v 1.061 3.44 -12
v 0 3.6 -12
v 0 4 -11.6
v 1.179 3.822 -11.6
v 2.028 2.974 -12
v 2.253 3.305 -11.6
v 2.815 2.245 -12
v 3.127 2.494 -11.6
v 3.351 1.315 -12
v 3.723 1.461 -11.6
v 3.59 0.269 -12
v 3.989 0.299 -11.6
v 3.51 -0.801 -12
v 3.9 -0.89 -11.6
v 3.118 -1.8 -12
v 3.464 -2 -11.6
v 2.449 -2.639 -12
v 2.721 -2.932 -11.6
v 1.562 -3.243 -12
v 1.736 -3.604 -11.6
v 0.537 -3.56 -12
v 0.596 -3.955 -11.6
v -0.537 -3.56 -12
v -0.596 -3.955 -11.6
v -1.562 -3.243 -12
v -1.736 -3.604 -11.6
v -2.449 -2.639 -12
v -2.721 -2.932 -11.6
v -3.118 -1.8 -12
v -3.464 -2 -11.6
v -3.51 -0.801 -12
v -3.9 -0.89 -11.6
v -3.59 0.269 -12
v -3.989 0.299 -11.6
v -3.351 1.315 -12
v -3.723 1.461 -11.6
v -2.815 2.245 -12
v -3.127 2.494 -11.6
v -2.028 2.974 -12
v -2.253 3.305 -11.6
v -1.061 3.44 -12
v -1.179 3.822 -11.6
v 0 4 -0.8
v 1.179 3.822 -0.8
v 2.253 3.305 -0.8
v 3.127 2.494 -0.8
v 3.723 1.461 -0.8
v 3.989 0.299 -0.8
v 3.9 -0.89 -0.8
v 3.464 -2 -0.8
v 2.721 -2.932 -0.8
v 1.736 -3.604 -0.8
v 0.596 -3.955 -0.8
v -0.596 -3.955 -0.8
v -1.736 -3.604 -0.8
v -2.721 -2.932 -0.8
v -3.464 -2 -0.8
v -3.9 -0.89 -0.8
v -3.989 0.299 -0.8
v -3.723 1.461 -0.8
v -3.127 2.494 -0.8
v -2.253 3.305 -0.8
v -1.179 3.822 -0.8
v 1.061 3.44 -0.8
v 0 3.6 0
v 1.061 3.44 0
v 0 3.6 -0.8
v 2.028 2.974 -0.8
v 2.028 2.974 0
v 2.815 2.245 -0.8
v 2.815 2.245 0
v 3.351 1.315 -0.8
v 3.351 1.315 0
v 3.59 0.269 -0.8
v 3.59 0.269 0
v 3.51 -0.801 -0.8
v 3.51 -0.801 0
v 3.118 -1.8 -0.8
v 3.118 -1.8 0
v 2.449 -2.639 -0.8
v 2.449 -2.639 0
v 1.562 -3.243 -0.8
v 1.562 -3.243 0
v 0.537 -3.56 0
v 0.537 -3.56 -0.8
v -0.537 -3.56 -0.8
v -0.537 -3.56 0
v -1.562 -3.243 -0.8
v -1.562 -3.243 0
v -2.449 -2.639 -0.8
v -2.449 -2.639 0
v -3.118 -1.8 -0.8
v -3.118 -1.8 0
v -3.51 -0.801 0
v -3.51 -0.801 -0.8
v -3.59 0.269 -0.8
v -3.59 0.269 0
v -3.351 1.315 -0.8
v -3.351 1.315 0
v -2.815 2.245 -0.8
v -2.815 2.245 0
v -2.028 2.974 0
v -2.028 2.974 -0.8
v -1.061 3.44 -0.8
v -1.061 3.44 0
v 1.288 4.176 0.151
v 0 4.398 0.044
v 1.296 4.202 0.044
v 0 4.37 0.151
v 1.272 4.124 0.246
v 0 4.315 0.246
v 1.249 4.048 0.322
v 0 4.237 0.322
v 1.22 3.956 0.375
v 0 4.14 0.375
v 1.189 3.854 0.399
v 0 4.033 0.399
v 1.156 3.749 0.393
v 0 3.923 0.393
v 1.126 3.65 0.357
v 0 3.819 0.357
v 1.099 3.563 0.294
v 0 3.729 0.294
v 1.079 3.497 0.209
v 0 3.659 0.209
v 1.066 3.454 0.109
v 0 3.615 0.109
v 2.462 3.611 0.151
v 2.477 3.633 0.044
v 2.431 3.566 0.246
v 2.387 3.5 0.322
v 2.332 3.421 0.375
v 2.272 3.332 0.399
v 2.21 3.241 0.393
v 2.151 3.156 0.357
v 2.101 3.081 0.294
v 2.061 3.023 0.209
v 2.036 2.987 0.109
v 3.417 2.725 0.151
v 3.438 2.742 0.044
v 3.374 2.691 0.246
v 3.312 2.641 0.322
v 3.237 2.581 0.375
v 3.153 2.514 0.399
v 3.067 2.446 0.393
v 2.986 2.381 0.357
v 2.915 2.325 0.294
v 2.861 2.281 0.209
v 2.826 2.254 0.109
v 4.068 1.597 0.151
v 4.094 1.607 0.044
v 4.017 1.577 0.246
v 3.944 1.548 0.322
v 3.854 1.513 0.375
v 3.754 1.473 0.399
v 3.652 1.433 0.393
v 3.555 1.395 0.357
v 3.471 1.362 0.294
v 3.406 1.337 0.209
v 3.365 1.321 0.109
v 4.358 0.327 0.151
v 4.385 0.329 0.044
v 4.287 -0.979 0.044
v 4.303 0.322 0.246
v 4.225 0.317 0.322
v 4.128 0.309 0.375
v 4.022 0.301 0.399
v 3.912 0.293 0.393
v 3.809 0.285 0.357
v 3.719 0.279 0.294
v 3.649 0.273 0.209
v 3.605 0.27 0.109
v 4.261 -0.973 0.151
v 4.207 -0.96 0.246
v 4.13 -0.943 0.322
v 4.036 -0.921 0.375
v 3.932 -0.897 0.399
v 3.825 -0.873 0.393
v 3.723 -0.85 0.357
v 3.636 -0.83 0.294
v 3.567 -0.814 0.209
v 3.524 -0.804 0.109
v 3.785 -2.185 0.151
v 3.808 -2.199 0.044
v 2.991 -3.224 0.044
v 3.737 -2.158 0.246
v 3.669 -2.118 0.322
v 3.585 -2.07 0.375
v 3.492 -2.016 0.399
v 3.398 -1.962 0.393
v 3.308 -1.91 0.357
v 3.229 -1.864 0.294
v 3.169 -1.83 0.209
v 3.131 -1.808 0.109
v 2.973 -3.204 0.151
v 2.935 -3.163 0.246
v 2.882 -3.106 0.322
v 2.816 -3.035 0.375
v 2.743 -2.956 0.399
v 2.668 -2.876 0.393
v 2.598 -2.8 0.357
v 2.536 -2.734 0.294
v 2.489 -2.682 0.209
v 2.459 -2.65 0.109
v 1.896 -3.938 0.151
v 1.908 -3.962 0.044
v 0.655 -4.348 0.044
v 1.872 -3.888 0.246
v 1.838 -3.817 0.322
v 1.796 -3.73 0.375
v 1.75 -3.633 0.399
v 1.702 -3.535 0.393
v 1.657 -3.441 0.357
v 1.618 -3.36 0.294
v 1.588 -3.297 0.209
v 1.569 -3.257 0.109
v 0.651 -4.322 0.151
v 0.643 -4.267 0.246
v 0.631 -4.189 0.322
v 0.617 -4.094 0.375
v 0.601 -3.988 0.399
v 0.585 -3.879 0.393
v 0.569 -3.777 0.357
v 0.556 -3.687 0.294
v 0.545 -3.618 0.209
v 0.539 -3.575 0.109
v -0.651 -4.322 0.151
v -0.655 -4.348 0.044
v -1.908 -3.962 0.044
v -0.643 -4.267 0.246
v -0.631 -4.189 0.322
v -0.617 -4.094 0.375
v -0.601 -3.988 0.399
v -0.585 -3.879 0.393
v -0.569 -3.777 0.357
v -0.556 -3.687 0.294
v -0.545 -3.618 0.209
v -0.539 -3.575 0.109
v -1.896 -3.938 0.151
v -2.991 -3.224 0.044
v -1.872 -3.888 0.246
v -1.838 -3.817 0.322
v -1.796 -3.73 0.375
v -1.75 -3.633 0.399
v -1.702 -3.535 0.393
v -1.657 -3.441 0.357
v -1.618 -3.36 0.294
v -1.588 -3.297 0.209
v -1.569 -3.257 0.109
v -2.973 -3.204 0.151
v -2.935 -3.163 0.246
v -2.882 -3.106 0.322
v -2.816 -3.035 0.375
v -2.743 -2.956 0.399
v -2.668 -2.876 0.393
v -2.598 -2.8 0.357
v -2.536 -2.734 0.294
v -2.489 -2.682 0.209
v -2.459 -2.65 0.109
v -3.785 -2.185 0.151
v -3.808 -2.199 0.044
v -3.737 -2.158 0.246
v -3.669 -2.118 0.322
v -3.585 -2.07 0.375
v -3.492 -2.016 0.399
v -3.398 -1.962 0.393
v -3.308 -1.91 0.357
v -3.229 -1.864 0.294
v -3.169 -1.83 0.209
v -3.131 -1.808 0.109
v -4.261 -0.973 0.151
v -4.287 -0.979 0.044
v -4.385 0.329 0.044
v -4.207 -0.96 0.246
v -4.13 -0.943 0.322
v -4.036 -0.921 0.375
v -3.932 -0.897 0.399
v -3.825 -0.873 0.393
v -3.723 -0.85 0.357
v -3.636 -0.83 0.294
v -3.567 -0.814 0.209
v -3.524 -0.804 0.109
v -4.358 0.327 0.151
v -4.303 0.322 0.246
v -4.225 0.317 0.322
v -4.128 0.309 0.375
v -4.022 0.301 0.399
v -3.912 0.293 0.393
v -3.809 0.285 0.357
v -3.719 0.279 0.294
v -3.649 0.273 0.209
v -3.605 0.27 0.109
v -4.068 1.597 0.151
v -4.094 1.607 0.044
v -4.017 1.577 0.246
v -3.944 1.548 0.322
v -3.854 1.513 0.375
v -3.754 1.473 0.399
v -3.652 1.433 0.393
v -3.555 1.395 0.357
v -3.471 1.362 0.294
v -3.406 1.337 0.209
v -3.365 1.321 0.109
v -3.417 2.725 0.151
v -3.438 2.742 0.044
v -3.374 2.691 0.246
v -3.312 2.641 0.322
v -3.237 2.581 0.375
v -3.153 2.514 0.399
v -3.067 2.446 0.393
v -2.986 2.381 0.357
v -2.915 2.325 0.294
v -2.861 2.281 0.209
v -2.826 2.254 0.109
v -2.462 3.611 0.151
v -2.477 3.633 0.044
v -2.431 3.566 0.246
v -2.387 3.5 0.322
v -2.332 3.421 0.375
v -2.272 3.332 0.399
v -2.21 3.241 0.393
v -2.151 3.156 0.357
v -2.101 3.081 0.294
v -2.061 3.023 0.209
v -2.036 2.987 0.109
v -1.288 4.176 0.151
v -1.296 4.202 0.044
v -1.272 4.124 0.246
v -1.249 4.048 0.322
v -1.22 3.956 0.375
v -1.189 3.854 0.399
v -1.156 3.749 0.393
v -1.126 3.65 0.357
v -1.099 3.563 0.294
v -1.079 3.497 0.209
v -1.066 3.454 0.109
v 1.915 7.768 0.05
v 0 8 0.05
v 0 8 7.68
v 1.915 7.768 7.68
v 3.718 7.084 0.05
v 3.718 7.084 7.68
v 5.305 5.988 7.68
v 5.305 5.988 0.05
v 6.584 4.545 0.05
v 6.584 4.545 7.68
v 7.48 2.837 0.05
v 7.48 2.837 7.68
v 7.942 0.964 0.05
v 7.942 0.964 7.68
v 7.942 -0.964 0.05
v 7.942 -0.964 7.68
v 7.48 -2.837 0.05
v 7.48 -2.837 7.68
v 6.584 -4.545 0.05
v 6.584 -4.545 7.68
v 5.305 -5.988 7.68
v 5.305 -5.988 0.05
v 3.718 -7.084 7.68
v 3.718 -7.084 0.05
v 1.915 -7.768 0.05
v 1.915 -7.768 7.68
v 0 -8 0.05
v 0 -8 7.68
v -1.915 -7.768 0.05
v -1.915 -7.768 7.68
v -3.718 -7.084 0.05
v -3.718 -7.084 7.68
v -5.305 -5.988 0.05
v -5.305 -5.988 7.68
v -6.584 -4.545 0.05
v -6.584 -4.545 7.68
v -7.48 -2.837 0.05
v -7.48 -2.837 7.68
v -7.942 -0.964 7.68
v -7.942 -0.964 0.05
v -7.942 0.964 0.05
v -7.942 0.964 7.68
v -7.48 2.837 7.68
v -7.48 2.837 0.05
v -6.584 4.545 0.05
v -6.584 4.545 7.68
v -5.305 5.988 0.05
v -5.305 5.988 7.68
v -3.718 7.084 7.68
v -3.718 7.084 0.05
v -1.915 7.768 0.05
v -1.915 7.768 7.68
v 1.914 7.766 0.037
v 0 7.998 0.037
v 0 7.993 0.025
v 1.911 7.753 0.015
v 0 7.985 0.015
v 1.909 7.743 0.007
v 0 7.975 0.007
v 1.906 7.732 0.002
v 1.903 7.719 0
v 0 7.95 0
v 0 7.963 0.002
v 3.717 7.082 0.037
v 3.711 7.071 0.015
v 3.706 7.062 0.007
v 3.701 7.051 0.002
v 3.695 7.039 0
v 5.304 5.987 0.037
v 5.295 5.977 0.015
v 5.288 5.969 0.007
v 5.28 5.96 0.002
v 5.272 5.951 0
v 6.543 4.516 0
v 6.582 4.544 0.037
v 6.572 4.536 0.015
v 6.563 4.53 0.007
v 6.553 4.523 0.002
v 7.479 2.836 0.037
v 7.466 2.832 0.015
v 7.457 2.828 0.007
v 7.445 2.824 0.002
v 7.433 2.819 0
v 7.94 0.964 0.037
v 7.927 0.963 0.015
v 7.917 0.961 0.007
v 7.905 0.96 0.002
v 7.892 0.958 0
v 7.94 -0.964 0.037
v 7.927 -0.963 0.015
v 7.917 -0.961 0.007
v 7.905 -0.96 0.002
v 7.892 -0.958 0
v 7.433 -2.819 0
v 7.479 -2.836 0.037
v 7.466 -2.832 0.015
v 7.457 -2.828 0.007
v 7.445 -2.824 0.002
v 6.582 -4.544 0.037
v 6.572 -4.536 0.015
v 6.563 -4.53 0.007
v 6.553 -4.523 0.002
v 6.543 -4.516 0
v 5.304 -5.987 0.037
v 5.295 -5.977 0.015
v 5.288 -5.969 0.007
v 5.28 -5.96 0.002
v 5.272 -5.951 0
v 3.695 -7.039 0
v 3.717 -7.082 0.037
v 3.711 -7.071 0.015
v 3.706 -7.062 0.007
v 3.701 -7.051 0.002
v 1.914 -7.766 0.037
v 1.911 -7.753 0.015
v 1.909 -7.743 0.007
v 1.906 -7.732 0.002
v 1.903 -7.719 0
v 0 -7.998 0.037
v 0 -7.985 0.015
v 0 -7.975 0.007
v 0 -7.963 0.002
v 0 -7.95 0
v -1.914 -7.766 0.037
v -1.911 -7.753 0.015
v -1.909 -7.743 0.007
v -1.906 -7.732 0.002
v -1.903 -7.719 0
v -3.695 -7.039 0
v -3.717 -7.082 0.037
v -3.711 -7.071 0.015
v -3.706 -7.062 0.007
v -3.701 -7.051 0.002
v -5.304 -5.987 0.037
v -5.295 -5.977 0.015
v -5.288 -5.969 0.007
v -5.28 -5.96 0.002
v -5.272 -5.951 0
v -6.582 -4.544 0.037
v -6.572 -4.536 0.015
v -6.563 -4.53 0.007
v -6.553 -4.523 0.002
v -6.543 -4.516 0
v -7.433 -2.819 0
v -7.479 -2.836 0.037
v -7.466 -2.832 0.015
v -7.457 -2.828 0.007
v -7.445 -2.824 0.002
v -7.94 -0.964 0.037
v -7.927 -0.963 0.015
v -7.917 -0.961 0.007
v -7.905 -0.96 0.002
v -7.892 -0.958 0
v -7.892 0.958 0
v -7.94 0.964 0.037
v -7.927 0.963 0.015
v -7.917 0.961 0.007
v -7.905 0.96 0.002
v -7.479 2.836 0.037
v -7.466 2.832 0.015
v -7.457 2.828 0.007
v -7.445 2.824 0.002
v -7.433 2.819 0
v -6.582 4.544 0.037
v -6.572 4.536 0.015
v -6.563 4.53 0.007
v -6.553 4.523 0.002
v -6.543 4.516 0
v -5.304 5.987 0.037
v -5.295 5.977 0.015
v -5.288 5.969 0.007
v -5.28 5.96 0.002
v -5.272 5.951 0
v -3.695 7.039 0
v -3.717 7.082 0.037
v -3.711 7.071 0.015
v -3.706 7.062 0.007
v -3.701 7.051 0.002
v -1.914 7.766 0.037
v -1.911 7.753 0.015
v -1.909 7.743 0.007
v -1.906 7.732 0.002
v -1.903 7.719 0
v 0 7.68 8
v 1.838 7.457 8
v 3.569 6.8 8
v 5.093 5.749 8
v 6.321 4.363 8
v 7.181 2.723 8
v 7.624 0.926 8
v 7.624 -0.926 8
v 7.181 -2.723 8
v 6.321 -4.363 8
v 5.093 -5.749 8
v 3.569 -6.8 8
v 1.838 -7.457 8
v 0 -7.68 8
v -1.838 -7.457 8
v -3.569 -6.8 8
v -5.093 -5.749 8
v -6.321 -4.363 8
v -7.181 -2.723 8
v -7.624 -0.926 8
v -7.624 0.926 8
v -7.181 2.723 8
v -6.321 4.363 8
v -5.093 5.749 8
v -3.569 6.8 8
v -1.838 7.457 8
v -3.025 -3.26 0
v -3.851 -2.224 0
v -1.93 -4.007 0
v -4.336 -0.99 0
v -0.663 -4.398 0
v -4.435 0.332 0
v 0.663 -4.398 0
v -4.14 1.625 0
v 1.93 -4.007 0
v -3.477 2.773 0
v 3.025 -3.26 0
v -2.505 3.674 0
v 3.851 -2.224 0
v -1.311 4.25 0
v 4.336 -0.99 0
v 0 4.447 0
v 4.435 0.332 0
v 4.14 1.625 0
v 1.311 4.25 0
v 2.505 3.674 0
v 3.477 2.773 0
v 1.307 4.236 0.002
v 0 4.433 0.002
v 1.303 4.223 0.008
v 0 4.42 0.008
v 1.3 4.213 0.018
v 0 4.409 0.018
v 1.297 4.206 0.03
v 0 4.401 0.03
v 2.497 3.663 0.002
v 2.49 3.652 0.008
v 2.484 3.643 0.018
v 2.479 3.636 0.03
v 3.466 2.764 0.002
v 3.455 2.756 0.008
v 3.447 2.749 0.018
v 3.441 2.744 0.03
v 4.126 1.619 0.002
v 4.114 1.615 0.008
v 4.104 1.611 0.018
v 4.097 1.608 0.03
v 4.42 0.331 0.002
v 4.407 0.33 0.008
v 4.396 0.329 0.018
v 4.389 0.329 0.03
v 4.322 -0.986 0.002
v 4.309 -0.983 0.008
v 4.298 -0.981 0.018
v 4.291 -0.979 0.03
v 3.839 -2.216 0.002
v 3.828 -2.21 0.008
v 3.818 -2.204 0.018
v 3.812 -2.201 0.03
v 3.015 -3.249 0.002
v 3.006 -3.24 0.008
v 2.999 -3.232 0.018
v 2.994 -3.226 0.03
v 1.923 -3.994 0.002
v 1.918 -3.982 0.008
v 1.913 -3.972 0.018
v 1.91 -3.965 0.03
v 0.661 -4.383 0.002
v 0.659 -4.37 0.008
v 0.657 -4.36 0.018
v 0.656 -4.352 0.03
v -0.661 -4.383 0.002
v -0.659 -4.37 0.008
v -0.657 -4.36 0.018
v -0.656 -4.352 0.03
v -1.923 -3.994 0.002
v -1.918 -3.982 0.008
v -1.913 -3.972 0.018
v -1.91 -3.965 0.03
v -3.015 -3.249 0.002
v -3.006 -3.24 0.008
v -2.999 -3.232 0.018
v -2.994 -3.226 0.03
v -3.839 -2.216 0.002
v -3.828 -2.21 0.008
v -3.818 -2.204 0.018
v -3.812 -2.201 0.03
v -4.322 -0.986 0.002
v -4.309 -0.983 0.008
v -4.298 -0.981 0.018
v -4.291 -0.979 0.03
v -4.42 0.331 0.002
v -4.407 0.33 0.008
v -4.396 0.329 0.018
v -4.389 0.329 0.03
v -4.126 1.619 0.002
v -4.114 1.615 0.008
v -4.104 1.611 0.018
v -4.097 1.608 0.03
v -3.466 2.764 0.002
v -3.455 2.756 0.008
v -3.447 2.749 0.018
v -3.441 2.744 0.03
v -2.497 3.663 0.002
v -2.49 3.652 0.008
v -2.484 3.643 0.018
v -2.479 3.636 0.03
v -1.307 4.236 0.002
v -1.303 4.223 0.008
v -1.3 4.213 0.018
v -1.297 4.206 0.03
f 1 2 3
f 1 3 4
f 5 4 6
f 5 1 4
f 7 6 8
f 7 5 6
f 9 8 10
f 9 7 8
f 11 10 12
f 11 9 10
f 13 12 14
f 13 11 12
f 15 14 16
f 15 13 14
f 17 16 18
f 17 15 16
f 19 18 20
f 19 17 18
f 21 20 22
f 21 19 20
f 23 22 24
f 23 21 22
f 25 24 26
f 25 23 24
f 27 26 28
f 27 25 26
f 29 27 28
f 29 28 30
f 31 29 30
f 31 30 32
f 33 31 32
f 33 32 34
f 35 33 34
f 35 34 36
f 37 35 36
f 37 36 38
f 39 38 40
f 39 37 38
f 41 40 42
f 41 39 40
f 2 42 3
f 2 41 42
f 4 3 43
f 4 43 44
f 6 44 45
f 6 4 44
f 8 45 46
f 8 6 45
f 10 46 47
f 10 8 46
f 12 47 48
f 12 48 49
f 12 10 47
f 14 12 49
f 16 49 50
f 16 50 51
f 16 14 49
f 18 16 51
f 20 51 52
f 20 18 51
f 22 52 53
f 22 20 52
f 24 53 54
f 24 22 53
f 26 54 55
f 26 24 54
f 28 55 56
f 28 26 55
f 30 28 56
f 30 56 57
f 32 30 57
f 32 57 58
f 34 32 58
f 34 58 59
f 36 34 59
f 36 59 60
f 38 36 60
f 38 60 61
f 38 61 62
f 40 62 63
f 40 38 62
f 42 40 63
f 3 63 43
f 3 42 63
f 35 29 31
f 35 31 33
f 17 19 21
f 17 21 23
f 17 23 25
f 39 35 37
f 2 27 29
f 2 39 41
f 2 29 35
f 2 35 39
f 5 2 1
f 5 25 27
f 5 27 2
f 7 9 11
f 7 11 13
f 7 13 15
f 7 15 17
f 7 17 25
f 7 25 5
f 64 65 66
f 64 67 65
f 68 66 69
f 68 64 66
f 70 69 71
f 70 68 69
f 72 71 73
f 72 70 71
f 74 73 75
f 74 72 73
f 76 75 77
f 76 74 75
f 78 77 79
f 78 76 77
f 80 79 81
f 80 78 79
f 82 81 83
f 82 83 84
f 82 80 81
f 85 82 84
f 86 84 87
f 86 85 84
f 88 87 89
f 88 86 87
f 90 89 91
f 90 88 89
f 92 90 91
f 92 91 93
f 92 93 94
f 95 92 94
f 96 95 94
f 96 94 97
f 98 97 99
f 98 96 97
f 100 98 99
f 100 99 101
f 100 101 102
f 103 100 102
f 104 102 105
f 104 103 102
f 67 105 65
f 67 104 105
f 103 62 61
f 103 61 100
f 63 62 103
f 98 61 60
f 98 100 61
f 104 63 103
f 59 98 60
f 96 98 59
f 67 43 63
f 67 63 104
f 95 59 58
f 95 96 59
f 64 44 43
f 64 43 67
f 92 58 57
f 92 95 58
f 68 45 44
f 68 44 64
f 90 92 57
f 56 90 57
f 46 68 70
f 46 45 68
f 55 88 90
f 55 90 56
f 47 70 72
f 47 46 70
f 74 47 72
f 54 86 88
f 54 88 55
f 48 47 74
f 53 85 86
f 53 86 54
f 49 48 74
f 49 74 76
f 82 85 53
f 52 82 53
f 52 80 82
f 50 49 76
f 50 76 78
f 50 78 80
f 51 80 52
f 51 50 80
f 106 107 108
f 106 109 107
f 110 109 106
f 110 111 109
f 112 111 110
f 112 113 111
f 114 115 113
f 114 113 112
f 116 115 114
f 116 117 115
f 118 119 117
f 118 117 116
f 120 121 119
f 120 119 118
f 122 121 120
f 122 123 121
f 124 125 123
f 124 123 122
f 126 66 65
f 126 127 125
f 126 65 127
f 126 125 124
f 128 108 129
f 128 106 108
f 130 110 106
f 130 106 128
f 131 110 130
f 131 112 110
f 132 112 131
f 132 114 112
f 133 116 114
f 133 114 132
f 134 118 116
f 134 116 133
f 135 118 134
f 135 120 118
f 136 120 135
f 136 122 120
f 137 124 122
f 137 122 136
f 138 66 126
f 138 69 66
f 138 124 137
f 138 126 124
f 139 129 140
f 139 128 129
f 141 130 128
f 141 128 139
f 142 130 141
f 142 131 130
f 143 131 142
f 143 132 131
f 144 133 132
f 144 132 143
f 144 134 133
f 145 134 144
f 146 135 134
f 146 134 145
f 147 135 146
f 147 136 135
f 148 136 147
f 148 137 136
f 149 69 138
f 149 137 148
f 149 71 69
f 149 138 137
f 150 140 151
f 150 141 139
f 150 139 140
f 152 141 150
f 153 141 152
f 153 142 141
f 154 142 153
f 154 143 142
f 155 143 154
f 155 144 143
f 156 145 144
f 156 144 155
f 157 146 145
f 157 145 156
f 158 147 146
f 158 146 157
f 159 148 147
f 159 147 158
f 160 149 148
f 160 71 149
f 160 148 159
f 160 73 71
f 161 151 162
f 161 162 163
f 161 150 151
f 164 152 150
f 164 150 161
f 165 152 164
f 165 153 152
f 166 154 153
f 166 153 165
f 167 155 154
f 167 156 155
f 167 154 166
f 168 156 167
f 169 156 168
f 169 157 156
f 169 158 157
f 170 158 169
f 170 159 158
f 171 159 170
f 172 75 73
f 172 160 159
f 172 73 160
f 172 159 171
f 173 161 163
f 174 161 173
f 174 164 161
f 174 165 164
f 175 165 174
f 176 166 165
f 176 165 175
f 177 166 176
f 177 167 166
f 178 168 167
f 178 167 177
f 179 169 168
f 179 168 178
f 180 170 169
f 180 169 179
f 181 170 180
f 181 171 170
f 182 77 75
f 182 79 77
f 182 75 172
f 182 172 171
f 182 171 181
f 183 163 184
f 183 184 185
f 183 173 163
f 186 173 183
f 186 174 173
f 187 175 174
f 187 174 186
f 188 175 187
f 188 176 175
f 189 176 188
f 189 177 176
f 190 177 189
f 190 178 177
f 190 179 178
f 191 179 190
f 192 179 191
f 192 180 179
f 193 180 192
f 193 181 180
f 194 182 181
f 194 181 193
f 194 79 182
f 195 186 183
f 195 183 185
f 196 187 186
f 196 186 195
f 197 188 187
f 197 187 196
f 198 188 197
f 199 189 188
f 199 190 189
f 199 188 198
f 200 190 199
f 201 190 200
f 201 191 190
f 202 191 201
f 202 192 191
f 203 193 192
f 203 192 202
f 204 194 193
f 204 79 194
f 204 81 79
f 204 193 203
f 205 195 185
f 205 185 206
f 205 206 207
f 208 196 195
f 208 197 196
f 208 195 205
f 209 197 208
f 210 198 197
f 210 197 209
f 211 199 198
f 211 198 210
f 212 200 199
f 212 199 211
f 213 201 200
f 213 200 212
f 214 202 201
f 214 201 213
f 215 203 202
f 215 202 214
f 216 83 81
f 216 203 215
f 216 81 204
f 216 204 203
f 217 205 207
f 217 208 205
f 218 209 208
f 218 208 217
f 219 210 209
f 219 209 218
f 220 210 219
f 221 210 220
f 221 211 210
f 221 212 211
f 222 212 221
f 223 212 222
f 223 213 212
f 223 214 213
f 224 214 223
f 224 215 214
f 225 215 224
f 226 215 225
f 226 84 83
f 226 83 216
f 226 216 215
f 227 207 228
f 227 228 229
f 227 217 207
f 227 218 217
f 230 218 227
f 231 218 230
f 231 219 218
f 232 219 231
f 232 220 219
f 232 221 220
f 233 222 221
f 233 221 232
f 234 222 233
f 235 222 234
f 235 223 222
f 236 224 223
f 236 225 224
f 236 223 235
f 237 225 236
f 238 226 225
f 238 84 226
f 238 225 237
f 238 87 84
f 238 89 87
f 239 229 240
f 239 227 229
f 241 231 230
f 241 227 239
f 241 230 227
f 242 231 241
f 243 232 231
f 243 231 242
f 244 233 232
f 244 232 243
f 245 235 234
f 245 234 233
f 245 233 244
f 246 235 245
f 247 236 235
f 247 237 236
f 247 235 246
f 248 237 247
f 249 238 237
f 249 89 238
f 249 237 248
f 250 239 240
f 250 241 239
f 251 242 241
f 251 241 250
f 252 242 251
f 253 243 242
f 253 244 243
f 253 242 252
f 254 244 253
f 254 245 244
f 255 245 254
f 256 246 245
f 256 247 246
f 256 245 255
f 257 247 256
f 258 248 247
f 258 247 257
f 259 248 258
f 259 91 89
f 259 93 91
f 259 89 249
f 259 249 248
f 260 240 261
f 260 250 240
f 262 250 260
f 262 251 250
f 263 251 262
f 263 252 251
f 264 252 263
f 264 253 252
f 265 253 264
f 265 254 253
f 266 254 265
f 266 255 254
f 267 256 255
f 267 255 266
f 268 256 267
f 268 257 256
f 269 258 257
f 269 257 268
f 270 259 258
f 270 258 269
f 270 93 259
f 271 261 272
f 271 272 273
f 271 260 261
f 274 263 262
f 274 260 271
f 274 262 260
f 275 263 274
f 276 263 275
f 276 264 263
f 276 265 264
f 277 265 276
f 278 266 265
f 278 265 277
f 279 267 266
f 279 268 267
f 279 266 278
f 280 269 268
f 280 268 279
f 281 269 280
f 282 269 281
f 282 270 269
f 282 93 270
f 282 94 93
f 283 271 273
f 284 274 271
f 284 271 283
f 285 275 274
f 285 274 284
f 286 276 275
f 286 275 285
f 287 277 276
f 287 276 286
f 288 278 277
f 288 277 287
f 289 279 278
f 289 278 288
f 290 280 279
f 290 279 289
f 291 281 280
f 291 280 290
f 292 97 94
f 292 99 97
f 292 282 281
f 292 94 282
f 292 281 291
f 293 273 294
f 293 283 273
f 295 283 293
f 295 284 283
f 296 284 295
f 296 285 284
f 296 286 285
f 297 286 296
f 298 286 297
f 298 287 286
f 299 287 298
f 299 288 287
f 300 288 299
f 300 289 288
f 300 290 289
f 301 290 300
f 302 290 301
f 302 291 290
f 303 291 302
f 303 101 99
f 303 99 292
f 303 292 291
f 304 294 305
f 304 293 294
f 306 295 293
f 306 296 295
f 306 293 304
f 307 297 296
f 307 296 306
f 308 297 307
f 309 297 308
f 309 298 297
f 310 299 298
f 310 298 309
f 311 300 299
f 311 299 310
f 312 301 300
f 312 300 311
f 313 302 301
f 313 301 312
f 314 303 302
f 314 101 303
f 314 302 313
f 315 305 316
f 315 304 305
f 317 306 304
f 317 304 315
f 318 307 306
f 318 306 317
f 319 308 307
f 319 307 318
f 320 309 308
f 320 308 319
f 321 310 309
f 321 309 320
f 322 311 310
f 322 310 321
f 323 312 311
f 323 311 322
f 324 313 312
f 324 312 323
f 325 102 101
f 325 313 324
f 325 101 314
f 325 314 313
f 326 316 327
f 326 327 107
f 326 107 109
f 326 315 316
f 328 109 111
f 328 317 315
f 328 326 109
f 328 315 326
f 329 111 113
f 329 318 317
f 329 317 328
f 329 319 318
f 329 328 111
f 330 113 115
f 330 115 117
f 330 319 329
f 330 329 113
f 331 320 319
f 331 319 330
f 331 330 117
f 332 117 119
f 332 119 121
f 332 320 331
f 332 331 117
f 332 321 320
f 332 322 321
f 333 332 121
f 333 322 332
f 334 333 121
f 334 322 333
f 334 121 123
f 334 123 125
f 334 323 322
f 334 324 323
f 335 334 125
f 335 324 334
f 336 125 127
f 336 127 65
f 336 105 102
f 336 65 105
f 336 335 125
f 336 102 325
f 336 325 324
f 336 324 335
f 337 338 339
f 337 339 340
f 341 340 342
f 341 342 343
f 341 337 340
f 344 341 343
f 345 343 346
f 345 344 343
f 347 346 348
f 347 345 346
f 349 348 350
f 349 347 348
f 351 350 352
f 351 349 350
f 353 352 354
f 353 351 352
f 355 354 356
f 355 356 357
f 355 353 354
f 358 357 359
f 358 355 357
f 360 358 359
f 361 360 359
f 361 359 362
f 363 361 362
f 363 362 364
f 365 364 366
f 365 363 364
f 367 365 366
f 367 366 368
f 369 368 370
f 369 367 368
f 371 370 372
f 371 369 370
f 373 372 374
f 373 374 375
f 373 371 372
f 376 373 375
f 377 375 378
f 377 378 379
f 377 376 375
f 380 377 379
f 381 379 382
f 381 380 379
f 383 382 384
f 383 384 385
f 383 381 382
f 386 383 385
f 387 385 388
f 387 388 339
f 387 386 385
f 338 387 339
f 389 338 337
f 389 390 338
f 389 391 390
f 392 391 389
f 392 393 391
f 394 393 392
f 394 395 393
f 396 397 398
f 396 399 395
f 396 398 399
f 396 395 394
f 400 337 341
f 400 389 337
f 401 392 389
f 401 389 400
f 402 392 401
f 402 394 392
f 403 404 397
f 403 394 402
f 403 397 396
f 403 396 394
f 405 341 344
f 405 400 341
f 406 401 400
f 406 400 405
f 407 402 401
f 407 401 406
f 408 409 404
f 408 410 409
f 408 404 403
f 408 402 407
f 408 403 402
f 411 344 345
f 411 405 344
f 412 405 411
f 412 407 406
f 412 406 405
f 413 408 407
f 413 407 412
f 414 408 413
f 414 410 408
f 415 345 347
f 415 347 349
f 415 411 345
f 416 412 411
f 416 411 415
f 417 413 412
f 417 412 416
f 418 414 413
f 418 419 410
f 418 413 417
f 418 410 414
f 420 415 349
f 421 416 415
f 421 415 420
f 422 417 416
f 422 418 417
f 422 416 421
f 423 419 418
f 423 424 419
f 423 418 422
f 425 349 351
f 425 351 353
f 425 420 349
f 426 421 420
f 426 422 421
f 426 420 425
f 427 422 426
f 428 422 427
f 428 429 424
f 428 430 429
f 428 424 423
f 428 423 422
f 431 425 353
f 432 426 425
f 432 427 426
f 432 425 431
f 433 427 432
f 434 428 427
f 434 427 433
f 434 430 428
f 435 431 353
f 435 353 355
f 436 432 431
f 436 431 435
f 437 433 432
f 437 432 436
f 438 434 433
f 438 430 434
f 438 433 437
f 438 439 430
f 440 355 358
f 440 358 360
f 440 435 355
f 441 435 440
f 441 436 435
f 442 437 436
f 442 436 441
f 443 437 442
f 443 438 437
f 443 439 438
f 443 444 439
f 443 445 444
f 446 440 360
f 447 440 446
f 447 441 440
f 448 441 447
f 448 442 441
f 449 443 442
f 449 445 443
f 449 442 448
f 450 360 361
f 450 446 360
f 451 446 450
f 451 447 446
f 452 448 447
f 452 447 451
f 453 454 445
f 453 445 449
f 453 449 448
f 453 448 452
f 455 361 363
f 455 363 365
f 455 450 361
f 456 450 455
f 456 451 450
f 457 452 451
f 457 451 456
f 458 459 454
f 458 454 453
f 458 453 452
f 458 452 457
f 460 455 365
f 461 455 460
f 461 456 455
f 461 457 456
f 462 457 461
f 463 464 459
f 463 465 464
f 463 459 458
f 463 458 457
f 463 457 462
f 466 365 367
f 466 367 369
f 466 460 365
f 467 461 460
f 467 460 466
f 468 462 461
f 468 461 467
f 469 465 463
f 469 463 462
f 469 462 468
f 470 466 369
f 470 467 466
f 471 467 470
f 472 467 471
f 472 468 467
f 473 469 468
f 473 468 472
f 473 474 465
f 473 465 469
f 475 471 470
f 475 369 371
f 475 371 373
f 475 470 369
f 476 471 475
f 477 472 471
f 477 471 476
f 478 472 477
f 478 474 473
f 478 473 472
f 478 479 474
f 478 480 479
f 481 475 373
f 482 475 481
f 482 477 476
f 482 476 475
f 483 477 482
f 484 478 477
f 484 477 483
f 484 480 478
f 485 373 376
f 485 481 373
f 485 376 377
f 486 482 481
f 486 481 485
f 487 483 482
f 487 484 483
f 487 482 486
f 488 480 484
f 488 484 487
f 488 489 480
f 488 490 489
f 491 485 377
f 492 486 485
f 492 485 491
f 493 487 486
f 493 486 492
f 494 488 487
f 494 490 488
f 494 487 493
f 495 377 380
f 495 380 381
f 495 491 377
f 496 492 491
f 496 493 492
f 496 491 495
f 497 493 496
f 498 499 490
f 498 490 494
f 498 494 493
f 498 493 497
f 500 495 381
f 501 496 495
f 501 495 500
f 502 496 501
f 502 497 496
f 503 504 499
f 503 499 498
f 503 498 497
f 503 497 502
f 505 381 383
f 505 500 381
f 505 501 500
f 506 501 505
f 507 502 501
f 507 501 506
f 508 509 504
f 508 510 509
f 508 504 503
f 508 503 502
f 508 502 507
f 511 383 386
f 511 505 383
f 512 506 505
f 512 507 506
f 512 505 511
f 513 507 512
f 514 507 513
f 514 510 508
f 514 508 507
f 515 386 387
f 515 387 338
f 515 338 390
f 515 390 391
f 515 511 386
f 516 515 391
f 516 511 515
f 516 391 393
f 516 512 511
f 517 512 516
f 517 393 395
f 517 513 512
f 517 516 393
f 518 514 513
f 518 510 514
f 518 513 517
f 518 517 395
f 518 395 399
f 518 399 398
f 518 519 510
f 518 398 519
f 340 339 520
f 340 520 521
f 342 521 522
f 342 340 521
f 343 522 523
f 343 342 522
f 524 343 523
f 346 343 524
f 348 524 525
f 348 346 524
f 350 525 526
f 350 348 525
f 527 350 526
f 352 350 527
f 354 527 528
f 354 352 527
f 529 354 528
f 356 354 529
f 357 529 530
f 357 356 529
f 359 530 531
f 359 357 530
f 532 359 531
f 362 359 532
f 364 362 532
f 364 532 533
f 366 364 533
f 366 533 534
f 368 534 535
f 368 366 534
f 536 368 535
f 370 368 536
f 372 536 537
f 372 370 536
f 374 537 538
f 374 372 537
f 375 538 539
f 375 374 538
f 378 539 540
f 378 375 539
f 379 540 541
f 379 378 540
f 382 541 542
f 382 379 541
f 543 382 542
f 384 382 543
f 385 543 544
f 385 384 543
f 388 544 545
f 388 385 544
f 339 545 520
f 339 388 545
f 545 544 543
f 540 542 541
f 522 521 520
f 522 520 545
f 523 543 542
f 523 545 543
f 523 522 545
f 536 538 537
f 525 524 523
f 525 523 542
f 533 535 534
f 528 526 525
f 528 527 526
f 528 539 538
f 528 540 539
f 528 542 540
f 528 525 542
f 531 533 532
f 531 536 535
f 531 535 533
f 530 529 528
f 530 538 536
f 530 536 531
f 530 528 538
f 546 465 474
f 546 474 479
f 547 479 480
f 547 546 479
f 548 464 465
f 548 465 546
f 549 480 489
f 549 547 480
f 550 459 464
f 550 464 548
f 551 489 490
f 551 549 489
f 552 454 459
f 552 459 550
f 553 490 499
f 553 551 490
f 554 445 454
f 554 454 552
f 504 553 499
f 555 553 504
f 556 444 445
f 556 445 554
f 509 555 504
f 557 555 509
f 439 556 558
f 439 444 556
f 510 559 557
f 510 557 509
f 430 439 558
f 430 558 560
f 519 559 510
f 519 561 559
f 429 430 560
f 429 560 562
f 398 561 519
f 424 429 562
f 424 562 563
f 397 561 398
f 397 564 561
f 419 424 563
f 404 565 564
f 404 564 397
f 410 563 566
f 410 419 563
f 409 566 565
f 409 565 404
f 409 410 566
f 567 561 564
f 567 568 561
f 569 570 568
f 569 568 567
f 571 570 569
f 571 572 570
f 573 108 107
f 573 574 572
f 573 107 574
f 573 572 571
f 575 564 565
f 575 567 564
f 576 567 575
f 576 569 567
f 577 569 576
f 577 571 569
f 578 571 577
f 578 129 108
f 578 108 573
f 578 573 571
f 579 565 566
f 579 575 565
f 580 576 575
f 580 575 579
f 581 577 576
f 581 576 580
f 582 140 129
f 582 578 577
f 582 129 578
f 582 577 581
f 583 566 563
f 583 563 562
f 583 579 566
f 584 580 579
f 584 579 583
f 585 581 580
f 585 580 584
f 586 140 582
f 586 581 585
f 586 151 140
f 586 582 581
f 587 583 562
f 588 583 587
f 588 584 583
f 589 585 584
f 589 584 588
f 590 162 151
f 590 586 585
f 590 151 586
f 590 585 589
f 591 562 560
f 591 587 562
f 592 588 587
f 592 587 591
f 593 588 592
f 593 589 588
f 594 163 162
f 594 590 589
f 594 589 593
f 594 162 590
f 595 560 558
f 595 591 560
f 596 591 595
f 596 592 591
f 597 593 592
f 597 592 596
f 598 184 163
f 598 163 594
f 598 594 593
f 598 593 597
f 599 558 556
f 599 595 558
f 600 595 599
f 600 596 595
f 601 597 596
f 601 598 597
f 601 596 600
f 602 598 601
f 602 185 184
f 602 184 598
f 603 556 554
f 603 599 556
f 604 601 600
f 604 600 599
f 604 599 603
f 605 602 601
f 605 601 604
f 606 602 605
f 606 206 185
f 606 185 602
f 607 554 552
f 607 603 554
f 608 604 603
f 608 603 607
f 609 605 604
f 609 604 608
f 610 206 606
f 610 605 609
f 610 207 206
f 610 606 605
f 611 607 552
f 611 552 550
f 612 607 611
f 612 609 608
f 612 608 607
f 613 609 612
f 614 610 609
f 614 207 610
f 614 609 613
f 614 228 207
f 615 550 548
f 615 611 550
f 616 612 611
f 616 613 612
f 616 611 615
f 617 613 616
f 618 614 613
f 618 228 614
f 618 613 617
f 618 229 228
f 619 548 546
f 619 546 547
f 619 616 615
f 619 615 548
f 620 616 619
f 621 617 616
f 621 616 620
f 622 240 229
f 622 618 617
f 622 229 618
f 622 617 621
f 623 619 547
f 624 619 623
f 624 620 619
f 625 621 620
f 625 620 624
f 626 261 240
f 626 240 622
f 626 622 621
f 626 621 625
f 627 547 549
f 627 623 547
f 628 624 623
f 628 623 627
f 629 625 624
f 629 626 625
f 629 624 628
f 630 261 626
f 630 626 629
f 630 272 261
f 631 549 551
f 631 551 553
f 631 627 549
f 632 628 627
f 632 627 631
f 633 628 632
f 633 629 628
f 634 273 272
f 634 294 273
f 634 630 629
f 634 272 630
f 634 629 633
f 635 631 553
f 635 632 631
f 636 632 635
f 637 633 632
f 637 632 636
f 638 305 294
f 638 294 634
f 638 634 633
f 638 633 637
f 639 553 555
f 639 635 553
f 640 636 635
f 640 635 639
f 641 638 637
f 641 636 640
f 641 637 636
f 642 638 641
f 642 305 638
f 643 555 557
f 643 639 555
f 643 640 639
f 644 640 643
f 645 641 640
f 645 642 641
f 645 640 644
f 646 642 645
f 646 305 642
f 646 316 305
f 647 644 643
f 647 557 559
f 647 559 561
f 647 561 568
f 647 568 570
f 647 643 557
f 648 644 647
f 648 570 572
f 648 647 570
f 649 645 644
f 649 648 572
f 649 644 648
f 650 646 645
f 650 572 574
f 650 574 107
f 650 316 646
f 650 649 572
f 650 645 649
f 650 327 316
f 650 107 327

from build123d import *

# Parameters (mm, degrees)
CHAMFER1_SIZE = 0.32
CHAMFER2_SIZE = 0.4


with BuildPart() as part:
    # Sketch1 → Revolve1 (revolve)
    with BuildSketch(Plane(origin=(0, 0, 0), x_dir=(0, 0, -1), z_dir=(1, 0, 0))):
        with BuildLine():
            Line((-8, 0), (-8, 8))
            Line((-8, 8), (-0.05, 8))
            ThreePointArc((-0.05, 8), (-0.014644661, 7.985355339), (0, 7.95))
            Line((0, 7.95), (0, 4.447213595))
            ThreePointArc((0, 4.447213595), (-0.0127322, 4.413880262), (-0.044444444, 4.397523196))
            ThreePointArc((-0.044444444, 4.397523196), (-0.399380319, 3.977743298), (0, 3.6))
            Line((0, 3.6), (0.8, 3.6))
            Line((0.8, 3.6), (0.8, 4))
            Line((0.8, 4), (12, 4))
            Line((12, 4), (12, 0))
            Line((12, 0), (-8, 0))
        make_face()
    revolve(axis=Axis((0, 0, 12.7), (0, 0, -1)))

    # Chamfer1
    chamfer1_edges = [part.edges().sort_by_distance(p)[0] for p in [
        (0, -8, 8),
    ]]
    chamfer(chamfer1_edges, length=CHAMFER1_SIZE)

    # Chamfer2
    chamfer2_edges = [part.edges().sort_by_distance(p)[0] for p in [
        (0, -4, -12),
    ]]
    chamfer(chamfer2_edges, length=CHAMFER2_SIZE)


solid = part.part
